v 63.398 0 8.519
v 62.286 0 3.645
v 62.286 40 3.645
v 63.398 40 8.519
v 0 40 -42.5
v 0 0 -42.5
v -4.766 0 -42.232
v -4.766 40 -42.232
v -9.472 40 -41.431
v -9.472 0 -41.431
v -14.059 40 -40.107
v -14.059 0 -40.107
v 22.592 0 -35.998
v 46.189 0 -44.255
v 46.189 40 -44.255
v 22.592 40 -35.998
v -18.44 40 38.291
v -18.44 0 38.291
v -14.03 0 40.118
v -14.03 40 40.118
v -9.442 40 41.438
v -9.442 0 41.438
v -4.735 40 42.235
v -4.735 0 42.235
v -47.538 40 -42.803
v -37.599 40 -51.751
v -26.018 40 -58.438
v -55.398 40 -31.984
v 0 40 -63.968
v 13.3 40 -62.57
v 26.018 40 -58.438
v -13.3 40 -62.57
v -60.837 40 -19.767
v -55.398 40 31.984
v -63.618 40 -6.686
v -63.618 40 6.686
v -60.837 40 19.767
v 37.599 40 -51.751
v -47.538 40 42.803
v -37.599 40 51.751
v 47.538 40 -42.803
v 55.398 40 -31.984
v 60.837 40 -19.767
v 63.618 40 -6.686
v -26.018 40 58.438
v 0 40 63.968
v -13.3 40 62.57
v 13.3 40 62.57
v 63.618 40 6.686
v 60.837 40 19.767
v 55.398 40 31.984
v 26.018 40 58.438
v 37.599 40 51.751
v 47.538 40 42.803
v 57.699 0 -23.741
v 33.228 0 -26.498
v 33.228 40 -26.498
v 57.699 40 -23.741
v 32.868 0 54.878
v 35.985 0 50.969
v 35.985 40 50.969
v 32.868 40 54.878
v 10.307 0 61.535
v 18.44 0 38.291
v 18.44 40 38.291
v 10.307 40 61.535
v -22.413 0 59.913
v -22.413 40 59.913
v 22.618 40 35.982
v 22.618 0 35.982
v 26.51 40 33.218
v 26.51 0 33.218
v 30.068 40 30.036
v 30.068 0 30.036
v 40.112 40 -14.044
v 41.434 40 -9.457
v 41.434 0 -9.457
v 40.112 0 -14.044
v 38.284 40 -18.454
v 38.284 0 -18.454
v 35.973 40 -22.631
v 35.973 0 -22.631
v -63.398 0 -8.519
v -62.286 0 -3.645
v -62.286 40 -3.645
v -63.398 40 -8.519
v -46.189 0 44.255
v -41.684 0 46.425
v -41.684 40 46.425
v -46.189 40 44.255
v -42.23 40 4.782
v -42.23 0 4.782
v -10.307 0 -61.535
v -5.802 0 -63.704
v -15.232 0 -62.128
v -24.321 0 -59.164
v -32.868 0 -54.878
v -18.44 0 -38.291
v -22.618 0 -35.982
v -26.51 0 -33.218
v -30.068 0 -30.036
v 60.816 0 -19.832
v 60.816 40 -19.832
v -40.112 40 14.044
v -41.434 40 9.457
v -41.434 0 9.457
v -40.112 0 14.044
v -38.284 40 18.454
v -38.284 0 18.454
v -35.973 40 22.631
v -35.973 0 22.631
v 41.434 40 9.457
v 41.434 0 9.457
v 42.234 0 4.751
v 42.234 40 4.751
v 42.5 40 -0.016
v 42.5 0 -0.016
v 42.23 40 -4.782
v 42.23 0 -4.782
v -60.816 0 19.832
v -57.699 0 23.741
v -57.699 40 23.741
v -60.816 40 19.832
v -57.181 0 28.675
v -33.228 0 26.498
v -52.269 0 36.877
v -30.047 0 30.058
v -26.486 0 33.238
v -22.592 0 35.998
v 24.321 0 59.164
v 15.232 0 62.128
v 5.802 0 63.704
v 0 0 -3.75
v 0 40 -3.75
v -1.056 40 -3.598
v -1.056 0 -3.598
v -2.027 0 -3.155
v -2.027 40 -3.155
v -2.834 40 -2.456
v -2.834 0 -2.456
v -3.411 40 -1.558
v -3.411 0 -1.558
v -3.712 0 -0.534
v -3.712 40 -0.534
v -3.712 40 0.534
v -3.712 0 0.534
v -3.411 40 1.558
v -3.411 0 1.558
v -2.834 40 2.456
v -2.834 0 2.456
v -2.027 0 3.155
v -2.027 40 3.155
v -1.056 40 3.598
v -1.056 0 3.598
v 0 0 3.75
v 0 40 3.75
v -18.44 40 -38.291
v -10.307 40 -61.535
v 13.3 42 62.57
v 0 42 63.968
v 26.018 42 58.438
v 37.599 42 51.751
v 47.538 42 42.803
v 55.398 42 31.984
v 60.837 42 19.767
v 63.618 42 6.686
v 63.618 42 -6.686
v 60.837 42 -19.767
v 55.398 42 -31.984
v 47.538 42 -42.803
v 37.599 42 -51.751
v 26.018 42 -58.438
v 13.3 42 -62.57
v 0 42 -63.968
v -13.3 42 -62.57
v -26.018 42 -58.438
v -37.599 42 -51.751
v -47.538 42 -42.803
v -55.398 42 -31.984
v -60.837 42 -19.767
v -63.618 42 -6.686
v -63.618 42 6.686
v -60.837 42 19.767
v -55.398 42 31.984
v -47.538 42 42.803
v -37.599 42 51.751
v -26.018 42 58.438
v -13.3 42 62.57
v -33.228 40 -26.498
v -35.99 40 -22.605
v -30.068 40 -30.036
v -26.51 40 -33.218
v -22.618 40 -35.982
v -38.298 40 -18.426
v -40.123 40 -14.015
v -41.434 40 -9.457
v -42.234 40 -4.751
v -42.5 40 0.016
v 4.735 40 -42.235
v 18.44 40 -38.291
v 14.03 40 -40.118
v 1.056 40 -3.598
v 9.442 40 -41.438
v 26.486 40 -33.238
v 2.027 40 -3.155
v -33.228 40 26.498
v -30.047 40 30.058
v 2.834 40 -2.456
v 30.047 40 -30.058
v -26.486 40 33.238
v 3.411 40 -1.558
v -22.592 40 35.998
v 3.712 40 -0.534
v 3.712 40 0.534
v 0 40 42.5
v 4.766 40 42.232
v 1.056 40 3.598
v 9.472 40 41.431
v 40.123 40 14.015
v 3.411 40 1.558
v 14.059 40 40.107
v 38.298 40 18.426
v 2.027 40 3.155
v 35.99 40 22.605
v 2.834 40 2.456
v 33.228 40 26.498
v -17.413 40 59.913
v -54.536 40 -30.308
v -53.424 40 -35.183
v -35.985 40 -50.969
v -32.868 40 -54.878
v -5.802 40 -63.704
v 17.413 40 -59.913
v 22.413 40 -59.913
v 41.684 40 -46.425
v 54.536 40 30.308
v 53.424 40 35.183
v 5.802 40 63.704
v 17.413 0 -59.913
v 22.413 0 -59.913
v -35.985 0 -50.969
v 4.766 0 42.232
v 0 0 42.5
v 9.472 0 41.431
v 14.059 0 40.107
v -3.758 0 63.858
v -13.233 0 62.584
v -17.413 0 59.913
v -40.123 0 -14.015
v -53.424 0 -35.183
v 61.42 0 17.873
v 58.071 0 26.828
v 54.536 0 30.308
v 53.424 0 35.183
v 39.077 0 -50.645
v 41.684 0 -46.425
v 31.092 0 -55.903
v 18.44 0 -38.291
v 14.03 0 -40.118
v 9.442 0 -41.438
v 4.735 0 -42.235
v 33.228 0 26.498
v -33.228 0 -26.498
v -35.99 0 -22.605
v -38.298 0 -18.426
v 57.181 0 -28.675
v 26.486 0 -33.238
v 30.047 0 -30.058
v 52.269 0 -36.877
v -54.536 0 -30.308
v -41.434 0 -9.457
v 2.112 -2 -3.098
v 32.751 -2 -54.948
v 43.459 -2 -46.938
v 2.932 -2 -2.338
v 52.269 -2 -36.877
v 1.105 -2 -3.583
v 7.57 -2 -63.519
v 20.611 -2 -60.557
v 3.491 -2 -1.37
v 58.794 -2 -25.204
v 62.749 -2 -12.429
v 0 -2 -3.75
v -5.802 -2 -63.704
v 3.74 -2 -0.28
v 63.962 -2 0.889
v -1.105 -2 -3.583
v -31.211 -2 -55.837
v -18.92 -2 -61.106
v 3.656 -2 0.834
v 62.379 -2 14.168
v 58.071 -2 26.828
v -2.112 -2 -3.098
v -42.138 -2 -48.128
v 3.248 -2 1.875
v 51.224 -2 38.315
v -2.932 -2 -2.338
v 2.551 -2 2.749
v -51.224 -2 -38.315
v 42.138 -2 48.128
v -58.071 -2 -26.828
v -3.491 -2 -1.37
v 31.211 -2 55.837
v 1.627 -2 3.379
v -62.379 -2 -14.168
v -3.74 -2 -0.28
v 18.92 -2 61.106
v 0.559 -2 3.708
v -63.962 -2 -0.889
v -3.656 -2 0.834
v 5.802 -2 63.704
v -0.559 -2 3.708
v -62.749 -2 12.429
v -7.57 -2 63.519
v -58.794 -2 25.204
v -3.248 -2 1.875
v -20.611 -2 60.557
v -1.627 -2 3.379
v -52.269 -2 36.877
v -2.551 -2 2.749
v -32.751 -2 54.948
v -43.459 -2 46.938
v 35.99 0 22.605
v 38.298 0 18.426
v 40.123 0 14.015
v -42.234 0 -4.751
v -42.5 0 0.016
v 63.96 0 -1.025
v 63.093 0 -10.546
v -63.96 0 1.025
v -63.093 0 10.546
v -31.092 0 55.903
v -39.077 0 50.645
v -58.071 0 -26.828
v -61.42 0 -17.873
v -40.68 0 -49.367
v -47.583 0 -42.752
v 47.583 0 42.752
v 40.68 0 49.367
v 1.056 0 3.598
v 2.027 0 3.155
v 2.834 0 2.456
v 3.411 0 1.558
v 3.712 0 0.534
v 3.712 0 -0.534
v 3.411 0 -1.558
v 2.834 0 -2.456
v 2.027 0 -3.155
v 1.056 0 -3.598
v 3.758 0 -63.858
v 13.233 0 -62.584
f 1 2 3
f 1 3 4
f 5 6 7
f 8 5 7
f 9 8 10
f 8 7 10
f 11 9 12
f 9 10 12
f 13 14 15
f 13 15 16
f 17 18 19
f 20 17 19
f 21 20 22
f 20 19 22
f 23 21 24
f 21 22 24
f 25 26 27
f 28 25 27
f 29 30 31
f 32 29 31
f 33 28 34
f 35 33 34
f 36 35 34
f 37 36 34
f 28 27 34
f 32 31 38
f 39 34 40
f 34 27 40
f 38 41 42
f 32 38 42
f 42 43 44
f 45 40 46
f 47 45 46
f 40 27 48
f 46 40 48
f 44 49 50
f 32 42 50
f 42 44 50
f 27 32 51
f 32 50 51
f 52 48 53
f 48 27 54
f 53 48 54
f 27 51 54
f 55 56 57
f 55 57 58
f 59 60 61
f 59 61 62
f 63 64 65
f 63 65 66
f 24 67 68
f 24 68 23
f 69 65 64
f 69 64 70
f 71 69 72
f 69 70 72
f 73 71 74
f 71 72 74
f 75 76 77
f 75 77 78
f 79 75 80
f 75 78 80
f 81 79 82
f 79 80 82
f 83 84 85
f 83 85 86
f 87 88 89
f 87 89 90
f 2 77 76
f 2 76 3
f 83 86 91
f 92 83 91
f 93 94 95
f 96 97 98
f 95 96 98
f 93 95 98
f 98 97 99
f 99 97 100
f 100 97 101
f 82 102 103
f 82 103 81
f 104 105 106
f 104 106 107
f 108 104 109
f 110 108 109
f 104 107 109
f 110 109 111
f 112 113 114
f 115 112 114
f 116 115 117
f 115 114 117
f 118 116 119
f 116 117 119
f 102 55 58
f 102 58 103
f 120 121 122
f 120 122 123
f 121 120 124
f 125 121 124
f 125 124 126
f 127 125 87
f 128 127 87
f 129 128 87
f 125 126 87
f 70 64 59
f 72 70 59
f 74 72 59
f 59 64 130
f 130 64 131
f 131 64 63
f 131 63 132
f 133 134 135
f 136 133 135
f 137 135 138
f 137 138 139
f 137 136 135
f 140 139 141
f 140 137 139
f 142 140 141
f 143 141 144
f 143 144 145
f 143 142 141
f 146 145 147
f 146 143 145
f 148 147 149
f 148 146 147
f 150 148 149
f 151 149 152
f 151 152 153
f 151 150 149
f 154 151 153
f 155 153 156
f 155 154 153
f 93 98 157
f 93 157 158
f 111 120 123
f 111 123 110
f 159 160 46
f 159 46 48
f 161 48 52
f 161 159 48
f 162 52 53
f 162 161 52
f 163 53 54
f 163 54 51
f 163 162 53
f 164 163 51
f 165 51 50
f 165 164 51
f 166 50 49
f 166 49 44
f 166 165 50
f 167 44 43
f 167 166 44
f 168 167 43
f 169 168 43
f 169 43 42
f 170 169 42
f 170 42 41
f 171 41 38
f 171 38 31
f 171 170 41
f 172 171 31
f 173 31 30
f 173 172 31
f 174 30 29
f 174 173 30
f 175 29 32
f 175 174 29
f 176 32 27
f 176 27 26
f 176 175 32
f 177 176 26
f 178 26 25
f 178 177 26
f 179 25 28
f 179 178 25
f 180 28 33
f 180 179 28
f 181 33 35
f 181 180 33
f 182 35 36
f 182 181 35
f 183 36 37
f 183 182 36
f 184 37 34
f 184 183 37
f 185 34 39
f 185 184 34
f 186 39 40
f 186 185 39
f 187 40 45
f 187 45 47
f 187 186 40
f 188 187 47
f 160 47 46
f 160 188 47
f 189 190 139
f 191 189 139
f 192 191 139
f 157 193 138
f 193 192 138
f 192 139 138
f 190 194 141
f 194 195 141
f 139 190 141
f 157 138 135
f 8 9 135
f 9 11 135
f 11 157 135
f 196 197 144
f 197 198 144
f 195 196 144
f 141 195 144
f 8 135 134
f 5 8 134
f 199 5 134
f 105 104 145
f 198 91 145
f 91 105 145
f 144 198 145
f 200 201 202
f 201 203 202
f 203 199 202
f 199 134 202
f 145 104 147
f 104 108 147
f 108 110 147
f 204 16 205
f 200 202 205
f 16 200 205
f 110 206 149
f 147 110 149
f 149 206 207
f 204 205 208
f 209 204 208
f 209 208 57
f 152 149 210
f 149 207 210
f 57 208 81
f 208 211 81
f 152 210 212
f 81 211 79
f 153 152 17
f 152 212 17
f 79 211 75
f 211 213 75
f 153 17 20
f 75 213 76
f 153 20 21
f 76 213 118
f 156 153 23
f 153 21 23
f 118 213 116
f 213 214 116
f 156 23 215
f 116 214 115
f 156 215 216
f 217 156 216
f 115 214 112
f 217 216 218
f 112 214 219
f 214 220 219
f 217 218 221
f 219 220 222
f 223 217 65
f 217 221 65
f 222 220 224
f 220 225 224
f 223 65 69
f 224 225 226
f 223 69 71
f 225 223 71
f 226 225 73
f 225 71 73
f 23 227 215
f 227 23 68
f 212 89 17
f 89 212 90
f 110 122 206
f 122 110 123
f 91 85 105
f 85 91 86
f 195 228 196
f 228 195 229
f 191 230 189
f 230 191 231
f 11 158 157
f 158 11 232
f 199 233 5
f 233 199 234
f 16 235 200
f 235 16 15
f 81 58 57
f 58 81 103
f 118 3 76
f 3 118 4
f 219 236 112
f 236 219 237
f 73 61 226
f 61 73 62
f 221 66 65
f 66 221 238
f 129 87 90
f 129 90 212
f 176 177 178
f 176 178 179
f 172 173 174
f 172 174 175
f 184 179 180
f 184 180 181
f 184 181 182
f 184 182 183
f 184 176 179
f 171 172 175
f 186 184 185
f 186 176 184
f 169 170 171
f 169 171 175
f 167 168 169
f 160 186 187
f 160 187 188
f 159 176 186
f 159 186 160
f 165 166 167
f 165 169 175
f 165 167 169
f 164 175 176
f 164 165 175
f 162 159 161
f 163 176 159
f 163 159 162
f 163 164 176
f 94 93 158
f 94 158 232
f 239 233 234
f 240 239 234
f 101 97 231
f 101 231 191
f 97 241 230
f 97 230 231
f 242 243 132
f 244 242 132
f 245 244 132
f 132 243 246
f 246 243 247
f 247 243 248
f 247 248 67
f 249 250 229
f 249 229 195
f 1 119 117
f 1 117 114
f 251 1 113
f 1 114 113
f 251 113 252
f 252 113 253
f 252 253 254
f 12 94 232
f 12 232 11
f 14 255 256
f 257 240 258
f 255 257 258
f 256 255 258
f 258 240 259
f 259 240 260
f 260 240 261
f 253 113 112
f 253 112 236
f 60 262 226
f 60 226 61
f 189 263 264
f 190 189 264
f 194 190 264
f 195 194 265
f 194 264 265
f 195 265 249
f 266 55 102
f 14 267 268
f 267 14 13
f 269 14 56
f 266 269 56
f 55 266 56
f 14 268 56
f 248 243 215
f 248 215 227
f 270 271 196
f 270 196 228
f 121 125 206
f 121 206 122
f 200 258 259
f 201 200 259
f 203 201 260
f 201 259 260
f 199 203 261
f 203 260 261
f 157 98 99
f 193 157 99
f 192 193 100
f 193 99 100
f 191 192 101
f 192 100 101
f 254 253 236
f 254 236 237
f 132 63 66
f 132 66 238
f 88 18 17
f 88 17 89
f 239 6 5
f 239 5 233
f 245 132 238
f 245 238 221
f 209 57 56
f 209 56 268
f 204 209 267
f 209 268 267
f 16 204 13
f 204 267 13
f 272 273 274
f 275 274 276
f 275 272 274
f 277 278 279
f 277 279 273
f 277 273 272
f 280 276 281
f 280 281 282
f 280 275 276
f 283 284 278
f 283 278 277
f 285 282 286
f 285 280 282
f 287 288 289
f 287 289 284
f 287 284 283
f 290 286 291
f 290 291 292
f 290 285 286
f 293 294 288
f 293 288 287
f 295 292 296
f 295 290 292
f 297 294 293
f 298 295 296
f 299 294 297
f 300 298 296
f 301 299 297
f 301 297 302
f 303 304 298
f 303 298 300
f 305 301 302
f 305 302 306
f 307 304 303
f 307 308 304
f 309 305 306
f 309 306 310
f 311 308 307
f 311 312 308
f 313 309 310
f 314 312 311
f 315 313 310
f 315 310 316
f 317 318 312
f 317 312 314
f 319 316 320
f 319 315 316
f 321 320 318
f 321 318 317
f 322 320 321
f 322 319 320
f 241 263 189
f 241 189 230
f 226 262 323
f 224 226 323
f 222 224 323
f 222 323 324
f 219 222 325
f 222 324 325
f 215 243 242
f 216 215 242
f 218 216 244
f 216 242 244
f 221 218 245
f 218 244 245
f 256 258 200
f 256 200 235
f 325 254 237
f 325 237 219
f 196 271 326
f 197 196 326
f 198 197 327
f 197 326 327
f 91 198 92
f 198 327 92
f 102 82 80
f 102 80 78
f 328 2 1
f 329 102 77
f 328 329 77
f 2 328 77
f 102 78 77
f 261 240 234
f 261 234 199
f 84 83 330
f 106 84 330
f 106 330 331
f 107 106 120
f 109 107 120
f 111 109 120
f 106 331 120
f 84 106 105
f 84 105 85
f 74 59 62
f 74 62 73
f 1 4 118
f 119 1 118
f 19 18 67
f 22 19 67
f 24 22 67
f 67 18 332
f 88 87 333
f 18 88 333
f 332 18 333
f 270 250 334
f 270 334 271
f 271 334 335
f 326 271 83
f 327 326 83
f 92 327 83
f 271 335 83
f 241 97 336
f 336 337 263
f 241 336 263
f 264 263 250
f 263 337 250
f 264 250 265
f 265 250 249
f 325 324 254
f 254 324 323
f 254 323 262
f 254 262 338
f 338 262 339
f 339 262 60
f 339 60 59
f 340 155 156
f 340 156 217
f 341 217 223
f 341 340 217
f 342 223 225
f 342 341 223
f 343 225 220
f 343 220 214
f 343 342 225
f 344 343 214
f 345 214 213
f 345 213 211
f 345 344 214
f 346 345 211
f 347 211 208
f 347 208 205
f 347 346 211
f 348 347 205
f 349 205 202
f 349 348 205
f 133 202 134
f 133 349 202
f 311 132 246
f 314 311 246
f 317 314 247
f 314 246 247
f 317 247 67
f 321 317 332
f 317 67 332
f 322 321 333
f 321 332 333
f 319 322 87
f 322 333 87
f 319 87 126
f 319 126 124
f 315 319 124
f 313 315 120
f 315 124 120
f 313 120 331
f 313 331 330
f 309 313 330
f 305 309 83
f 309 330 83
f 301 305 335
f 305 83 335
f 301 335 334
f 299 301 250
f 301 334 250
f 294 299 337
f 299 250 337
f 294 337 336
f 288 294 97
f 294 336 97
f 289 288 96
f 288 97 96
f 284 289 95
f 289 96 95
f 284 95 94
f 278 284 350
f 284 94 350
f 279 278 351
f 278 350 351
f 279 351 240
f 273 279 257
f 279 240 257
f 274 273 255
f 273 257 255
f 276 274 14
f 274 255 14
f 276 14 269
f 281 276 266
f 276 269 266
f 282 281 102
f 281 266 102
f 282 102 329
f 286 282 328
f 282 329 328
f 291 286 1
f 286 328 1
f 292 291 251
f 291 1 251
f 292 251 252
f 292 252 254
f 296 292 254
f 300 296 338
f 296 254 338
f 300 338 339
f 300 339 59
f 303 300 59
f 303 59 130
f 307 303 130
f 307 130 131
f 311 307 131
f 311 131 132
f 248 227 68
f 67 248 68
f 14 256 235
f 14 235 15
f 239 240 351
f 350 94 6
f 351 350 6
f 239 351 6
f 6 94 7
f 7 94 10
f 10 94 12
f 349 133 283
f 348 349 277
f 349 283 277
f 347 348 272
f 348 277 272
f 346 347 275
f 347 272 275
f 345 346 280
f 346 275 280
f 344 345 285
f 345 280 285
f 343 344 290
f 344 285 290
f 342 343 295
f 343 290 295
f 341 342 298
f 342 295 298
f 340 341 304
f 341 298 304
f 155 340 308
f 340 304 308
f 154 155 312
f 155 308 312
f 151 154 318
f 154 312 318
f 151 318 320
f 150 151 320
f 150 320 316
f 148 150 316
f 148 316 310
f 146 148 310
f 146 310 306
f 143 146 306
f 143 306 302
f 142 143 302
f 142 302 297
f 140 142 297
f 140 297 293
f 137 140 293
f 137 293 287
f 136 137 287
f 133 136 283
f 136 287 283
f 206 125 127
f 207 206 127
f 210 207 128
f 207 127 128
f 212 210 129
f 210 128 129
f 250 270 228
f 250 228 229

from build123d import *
from build123d.topology import SkipClean

# Parameters (mm, degrees)
SKETCH1_R           = 42.5
SKETCH1_R_2         = 3.75
BOSS_EXTRUDE1_DEPTH = 40
BOSS_EXTRUDE2_DEPTH = 40
SKETCH3_R           = 63.968087997
BOSS_EXTRUDE3_DEPTH = 2
BOSS_EXTRUDE4_START = 2
SKETCH4_R           = 63.968087997
BOSS_EXTRUDE4_DEPTH = 2
SKETCH6_R           = 3.75
CUT_EXTRUDE1_DEPTH  = 79


with BuildPart() as part:
    # Sketch1 → Boss-Extrude1 (new body)
    with BuildSketch(Plane(origin=(0, 0, 0), x_dir=(1, 0, 0), z_dir=(0, 1, 0))):
        with Locations(Location((0, 0, 0), (0, 0, 270))):
            Circle(SKETCH1_R)
        with Locations(Location((0, 0, 0), (0, 0, 270))):
            Circle(SKETCH1_R_2, mode=Mode.SUBTRACT)
    extrude(amount=BOSS_EXTRUDE1_DEPTH)

    # Sketch2 → Boss-Extrude2 (add)
    with BuildSketch(Plane.XZ):
        with BuildLine():
            Line((0, -42.5), (17.413037315, -59.913037315))
            Line((17.413037315, -59.913037315), (22.413037315, -59.913037315))
            Line((22.413037315, -59.913037315), (4.735367785, -42.235367785))
            ThreePointArc((4.735367785, -42.235367785), (2.3713782, -42.433790373), (0, -42.5))
        make_face()
        with BuildLine():
            Line((-18.440058912, -38.291176886), (-10.306688136, -61.535015142))
            Line((-10.306688136, -61.535015142), (-5.801843796, -63.704433837))
            Line((-5.801843796, -63.704433837), (-14.058820345, -40.107350579))
            ThreePointArc((-14.058820345, -40.107350579), (-16.2747937, -39.260426514), (-18.440058912, -38.291176886))
        make_face()
        with BuildLine():
            Line((-33.227838005, -26.498316579), (-35.985047598, -50.969228542))
            Line((-35.985047598, -50.969228542), (-32.867598589, -54.878385955))
            Line((-32.867598589, -54.878385955), (-30.068486686, -30.035580707))
            ThreePointArc((-30.068486686, -30.035580707), (-31.69754311, -28.311053685), (-33.227838005, -26.498316579))
        make_face()
        with BuildLine():
            Line((-41.434436268, -9.457139693), (-54.536127055, -30.308361133))
            Line((-54.536127055, -30.308361133), (-53.423522386, -35.183000694))
            Line((-53.423522386, -35.183000694), (-40.122720473, -14.014895714))
            ThreePointArc((-40.122720473, -14.014895714), (-40.842205363, -11.754329463), (-41.434436268, -9.457139693))
        make_face()
        with BuildLine():
            Line((-41.434436268, 9.457139693), (-62.285657708, -3.644551095))
            Line((-62.285657708, -3.644551095), (-63.398262378, -8.519190655))
            Line((-63.398262378, -8.519190655), (-42.230157397, 4.781611257))
            ThreePointArc((-42.230157397, 4.781611257), (-41.897567946, 7.130483868), (-41.434436268, 9.457139693))
        make_face()
        with BuildLine():
            Line((-33.227838005, 26.498316579), (-57.698749968, 23.741106986))
            Line((-57.698749968, 23.741106986), (-60.816198977, 19.831949574))
            Line((-60.816198977, 19.831949574), (-35.97339373, 22.631061476))
            ThreePointArc((-35.97339373, 22.631061476), (-34.654603358, 24.603017418), (-33.227838005, 26.498316579))
        make_face()
        with BuildLine():
            Line((-18.440058912, 38.291176886), (-41.683897168, 46.424547663))
            Line((-41.683897168, 46.424547663), (-46.188741508, 44.255128967))
            Line((-46.188741508, 44.255128967), (-22.59165825, 35.998152418))
            ThreePointArc((-22.59165825, 35.998152418), (-20.547869564, 37.202621633), (-18.440058912, 38.291176886))
        make_face()
        with BuildLine():
            Line((0, 42.5), (-17.413037315, 59.913037315))
            Line((-17.413037315, 59.913037315), (-22.413037315, 59.913037315))
            Line((-22.413037315, 59.913037315), (-4.735367785, 42.235367785))
            ThreePointArc((-4.735367785, 42.235367785), (-2.3713782, 42.433790373), (0, 42.5))
        make_face()
        with BuildLine():
            Line((18.440058912, 38.291176886), (10.306688136, 61.535015142))
            Line((10.306688136, 61.535015142), (5.801843796, 63.704433837))
            Line((5.801843796, 63.704433837), (14.058820345, 40.107350579))
            ThreePointArc((14.058820345, 40.107350579), (16.2747937, 39.260426514), (18.440058912, 38.291176886))
        make_face()
        with BuildLine():
            Line((33.227838005, 26.498316579), (35.985047598, 50.969228542))
            Line((35.985047598, 50.969228542), (32.867598589, 54.878385955))
            Line((32.867598589, 54.878385955), (30.068486686, 30.035580707))
            ThreePointArc((30.068486686, 30.035580707), (31.69754311, 28.311053685), (33.227838005, 26.498316579))
        make_face()
        with BuildLine():
            Line((41.434436268, 9.457139693), (54.536127055, 30.308361133))
            Line((54.536127055, 30.308361133), (53.423522386, 35.183000694))
            Line((53.423522386, 35.183000694), (40.122720473, 14.014895714))
            ThreePointArc((40.122720473, 14.014895714), (40.842205363, 11.754329463), (41.434436268, 9.457139693))
        make_face()
        with BuildLine():
            Line((41.434436268, -9.457139693), (62.285657708, 3.644551095))
            Line((62.285657708, 3.644551095), (63.398262378, 8.519190655))
            Line((63.398262378, 8.519190655), (42.230157397, -4.781611257))
            ThreePointArc((42.230157397, -4.781611257), (41.897567946, -7.130483868), (41.434436268, -9.457139693))
        make_face()
        with BuildLine():
            Line((33.227838005, -26.498316579), (57.698749968, -23.741106986))
            Line((57.698749968, -23.741106986), (60.816198977, -19.831949574))
            Line((60.816198977, -19.831949574), (35.97339373, -22.631061476))
            ThreePointArc((35.97339373, -22.631061476), (34.654603358, -24.603017418), (33.227838005, -26.498316579))
        make_face()
        with BuildLine():
            Line((18.440058912, -38.291176886), (41.683897168, -46.424547663))
            Line((41.683897168, -46.424547663), (46.188741508, -44.255128967))
            Line((46.188741508, -44.255128967), (22.59165825, -35.998152418))
            ThreePointArc((22.59165825, -35.998152418), (20.547869564, -37.202621633), (18.440058912, -38.291176886))
        make_face()
    extrude(amount=-BOSS_EXTRUDE2_DEPTH)

    # Sketch3 → Boss-Extrude3 (add)
    with BuildSketch(Plane.XZ):
        with Locations(Location((0, 0, 0), (0, 0, 84.796176724))):
            Circle(SKETCH3_R)
    extrude(amount=BOSS_EXTRUDE3_DEPTH)

    # Sketch6 → Cut-Extrude1 (cut)
    with SkipClean():  # the faces are left unmerged after this step: merging them gives an invalid solid
        with BuildSketch(Plane.XZ.offset(2)):
            with Locations(Location((0, 0, 0), (0, 0, 270))):
                Circle(SKETCH6_R)
        extrude(amount=-CUT_EXTRUDE1_DEPTH, mode=Mode.SUBTRACT)


with BuildPart() as body_2:
    # Sketch4 → Boss-Extrude4 (new body)
    with BuildSketch(Plane(origin=(0, 40, 0), x_dir=(1, 0, 0), z_dir=(0, 1, 0)).offset(BOSS_EXTRUDE4_START)):
        with Locations(Location((0, 0, 0), (0, 0, 270))):
            Circle(SKETCH4_R)
    extrude(amount=-BOSS_EXTRUDE4_DEPTH)


solid = Compound([part.part, body_2.part])
